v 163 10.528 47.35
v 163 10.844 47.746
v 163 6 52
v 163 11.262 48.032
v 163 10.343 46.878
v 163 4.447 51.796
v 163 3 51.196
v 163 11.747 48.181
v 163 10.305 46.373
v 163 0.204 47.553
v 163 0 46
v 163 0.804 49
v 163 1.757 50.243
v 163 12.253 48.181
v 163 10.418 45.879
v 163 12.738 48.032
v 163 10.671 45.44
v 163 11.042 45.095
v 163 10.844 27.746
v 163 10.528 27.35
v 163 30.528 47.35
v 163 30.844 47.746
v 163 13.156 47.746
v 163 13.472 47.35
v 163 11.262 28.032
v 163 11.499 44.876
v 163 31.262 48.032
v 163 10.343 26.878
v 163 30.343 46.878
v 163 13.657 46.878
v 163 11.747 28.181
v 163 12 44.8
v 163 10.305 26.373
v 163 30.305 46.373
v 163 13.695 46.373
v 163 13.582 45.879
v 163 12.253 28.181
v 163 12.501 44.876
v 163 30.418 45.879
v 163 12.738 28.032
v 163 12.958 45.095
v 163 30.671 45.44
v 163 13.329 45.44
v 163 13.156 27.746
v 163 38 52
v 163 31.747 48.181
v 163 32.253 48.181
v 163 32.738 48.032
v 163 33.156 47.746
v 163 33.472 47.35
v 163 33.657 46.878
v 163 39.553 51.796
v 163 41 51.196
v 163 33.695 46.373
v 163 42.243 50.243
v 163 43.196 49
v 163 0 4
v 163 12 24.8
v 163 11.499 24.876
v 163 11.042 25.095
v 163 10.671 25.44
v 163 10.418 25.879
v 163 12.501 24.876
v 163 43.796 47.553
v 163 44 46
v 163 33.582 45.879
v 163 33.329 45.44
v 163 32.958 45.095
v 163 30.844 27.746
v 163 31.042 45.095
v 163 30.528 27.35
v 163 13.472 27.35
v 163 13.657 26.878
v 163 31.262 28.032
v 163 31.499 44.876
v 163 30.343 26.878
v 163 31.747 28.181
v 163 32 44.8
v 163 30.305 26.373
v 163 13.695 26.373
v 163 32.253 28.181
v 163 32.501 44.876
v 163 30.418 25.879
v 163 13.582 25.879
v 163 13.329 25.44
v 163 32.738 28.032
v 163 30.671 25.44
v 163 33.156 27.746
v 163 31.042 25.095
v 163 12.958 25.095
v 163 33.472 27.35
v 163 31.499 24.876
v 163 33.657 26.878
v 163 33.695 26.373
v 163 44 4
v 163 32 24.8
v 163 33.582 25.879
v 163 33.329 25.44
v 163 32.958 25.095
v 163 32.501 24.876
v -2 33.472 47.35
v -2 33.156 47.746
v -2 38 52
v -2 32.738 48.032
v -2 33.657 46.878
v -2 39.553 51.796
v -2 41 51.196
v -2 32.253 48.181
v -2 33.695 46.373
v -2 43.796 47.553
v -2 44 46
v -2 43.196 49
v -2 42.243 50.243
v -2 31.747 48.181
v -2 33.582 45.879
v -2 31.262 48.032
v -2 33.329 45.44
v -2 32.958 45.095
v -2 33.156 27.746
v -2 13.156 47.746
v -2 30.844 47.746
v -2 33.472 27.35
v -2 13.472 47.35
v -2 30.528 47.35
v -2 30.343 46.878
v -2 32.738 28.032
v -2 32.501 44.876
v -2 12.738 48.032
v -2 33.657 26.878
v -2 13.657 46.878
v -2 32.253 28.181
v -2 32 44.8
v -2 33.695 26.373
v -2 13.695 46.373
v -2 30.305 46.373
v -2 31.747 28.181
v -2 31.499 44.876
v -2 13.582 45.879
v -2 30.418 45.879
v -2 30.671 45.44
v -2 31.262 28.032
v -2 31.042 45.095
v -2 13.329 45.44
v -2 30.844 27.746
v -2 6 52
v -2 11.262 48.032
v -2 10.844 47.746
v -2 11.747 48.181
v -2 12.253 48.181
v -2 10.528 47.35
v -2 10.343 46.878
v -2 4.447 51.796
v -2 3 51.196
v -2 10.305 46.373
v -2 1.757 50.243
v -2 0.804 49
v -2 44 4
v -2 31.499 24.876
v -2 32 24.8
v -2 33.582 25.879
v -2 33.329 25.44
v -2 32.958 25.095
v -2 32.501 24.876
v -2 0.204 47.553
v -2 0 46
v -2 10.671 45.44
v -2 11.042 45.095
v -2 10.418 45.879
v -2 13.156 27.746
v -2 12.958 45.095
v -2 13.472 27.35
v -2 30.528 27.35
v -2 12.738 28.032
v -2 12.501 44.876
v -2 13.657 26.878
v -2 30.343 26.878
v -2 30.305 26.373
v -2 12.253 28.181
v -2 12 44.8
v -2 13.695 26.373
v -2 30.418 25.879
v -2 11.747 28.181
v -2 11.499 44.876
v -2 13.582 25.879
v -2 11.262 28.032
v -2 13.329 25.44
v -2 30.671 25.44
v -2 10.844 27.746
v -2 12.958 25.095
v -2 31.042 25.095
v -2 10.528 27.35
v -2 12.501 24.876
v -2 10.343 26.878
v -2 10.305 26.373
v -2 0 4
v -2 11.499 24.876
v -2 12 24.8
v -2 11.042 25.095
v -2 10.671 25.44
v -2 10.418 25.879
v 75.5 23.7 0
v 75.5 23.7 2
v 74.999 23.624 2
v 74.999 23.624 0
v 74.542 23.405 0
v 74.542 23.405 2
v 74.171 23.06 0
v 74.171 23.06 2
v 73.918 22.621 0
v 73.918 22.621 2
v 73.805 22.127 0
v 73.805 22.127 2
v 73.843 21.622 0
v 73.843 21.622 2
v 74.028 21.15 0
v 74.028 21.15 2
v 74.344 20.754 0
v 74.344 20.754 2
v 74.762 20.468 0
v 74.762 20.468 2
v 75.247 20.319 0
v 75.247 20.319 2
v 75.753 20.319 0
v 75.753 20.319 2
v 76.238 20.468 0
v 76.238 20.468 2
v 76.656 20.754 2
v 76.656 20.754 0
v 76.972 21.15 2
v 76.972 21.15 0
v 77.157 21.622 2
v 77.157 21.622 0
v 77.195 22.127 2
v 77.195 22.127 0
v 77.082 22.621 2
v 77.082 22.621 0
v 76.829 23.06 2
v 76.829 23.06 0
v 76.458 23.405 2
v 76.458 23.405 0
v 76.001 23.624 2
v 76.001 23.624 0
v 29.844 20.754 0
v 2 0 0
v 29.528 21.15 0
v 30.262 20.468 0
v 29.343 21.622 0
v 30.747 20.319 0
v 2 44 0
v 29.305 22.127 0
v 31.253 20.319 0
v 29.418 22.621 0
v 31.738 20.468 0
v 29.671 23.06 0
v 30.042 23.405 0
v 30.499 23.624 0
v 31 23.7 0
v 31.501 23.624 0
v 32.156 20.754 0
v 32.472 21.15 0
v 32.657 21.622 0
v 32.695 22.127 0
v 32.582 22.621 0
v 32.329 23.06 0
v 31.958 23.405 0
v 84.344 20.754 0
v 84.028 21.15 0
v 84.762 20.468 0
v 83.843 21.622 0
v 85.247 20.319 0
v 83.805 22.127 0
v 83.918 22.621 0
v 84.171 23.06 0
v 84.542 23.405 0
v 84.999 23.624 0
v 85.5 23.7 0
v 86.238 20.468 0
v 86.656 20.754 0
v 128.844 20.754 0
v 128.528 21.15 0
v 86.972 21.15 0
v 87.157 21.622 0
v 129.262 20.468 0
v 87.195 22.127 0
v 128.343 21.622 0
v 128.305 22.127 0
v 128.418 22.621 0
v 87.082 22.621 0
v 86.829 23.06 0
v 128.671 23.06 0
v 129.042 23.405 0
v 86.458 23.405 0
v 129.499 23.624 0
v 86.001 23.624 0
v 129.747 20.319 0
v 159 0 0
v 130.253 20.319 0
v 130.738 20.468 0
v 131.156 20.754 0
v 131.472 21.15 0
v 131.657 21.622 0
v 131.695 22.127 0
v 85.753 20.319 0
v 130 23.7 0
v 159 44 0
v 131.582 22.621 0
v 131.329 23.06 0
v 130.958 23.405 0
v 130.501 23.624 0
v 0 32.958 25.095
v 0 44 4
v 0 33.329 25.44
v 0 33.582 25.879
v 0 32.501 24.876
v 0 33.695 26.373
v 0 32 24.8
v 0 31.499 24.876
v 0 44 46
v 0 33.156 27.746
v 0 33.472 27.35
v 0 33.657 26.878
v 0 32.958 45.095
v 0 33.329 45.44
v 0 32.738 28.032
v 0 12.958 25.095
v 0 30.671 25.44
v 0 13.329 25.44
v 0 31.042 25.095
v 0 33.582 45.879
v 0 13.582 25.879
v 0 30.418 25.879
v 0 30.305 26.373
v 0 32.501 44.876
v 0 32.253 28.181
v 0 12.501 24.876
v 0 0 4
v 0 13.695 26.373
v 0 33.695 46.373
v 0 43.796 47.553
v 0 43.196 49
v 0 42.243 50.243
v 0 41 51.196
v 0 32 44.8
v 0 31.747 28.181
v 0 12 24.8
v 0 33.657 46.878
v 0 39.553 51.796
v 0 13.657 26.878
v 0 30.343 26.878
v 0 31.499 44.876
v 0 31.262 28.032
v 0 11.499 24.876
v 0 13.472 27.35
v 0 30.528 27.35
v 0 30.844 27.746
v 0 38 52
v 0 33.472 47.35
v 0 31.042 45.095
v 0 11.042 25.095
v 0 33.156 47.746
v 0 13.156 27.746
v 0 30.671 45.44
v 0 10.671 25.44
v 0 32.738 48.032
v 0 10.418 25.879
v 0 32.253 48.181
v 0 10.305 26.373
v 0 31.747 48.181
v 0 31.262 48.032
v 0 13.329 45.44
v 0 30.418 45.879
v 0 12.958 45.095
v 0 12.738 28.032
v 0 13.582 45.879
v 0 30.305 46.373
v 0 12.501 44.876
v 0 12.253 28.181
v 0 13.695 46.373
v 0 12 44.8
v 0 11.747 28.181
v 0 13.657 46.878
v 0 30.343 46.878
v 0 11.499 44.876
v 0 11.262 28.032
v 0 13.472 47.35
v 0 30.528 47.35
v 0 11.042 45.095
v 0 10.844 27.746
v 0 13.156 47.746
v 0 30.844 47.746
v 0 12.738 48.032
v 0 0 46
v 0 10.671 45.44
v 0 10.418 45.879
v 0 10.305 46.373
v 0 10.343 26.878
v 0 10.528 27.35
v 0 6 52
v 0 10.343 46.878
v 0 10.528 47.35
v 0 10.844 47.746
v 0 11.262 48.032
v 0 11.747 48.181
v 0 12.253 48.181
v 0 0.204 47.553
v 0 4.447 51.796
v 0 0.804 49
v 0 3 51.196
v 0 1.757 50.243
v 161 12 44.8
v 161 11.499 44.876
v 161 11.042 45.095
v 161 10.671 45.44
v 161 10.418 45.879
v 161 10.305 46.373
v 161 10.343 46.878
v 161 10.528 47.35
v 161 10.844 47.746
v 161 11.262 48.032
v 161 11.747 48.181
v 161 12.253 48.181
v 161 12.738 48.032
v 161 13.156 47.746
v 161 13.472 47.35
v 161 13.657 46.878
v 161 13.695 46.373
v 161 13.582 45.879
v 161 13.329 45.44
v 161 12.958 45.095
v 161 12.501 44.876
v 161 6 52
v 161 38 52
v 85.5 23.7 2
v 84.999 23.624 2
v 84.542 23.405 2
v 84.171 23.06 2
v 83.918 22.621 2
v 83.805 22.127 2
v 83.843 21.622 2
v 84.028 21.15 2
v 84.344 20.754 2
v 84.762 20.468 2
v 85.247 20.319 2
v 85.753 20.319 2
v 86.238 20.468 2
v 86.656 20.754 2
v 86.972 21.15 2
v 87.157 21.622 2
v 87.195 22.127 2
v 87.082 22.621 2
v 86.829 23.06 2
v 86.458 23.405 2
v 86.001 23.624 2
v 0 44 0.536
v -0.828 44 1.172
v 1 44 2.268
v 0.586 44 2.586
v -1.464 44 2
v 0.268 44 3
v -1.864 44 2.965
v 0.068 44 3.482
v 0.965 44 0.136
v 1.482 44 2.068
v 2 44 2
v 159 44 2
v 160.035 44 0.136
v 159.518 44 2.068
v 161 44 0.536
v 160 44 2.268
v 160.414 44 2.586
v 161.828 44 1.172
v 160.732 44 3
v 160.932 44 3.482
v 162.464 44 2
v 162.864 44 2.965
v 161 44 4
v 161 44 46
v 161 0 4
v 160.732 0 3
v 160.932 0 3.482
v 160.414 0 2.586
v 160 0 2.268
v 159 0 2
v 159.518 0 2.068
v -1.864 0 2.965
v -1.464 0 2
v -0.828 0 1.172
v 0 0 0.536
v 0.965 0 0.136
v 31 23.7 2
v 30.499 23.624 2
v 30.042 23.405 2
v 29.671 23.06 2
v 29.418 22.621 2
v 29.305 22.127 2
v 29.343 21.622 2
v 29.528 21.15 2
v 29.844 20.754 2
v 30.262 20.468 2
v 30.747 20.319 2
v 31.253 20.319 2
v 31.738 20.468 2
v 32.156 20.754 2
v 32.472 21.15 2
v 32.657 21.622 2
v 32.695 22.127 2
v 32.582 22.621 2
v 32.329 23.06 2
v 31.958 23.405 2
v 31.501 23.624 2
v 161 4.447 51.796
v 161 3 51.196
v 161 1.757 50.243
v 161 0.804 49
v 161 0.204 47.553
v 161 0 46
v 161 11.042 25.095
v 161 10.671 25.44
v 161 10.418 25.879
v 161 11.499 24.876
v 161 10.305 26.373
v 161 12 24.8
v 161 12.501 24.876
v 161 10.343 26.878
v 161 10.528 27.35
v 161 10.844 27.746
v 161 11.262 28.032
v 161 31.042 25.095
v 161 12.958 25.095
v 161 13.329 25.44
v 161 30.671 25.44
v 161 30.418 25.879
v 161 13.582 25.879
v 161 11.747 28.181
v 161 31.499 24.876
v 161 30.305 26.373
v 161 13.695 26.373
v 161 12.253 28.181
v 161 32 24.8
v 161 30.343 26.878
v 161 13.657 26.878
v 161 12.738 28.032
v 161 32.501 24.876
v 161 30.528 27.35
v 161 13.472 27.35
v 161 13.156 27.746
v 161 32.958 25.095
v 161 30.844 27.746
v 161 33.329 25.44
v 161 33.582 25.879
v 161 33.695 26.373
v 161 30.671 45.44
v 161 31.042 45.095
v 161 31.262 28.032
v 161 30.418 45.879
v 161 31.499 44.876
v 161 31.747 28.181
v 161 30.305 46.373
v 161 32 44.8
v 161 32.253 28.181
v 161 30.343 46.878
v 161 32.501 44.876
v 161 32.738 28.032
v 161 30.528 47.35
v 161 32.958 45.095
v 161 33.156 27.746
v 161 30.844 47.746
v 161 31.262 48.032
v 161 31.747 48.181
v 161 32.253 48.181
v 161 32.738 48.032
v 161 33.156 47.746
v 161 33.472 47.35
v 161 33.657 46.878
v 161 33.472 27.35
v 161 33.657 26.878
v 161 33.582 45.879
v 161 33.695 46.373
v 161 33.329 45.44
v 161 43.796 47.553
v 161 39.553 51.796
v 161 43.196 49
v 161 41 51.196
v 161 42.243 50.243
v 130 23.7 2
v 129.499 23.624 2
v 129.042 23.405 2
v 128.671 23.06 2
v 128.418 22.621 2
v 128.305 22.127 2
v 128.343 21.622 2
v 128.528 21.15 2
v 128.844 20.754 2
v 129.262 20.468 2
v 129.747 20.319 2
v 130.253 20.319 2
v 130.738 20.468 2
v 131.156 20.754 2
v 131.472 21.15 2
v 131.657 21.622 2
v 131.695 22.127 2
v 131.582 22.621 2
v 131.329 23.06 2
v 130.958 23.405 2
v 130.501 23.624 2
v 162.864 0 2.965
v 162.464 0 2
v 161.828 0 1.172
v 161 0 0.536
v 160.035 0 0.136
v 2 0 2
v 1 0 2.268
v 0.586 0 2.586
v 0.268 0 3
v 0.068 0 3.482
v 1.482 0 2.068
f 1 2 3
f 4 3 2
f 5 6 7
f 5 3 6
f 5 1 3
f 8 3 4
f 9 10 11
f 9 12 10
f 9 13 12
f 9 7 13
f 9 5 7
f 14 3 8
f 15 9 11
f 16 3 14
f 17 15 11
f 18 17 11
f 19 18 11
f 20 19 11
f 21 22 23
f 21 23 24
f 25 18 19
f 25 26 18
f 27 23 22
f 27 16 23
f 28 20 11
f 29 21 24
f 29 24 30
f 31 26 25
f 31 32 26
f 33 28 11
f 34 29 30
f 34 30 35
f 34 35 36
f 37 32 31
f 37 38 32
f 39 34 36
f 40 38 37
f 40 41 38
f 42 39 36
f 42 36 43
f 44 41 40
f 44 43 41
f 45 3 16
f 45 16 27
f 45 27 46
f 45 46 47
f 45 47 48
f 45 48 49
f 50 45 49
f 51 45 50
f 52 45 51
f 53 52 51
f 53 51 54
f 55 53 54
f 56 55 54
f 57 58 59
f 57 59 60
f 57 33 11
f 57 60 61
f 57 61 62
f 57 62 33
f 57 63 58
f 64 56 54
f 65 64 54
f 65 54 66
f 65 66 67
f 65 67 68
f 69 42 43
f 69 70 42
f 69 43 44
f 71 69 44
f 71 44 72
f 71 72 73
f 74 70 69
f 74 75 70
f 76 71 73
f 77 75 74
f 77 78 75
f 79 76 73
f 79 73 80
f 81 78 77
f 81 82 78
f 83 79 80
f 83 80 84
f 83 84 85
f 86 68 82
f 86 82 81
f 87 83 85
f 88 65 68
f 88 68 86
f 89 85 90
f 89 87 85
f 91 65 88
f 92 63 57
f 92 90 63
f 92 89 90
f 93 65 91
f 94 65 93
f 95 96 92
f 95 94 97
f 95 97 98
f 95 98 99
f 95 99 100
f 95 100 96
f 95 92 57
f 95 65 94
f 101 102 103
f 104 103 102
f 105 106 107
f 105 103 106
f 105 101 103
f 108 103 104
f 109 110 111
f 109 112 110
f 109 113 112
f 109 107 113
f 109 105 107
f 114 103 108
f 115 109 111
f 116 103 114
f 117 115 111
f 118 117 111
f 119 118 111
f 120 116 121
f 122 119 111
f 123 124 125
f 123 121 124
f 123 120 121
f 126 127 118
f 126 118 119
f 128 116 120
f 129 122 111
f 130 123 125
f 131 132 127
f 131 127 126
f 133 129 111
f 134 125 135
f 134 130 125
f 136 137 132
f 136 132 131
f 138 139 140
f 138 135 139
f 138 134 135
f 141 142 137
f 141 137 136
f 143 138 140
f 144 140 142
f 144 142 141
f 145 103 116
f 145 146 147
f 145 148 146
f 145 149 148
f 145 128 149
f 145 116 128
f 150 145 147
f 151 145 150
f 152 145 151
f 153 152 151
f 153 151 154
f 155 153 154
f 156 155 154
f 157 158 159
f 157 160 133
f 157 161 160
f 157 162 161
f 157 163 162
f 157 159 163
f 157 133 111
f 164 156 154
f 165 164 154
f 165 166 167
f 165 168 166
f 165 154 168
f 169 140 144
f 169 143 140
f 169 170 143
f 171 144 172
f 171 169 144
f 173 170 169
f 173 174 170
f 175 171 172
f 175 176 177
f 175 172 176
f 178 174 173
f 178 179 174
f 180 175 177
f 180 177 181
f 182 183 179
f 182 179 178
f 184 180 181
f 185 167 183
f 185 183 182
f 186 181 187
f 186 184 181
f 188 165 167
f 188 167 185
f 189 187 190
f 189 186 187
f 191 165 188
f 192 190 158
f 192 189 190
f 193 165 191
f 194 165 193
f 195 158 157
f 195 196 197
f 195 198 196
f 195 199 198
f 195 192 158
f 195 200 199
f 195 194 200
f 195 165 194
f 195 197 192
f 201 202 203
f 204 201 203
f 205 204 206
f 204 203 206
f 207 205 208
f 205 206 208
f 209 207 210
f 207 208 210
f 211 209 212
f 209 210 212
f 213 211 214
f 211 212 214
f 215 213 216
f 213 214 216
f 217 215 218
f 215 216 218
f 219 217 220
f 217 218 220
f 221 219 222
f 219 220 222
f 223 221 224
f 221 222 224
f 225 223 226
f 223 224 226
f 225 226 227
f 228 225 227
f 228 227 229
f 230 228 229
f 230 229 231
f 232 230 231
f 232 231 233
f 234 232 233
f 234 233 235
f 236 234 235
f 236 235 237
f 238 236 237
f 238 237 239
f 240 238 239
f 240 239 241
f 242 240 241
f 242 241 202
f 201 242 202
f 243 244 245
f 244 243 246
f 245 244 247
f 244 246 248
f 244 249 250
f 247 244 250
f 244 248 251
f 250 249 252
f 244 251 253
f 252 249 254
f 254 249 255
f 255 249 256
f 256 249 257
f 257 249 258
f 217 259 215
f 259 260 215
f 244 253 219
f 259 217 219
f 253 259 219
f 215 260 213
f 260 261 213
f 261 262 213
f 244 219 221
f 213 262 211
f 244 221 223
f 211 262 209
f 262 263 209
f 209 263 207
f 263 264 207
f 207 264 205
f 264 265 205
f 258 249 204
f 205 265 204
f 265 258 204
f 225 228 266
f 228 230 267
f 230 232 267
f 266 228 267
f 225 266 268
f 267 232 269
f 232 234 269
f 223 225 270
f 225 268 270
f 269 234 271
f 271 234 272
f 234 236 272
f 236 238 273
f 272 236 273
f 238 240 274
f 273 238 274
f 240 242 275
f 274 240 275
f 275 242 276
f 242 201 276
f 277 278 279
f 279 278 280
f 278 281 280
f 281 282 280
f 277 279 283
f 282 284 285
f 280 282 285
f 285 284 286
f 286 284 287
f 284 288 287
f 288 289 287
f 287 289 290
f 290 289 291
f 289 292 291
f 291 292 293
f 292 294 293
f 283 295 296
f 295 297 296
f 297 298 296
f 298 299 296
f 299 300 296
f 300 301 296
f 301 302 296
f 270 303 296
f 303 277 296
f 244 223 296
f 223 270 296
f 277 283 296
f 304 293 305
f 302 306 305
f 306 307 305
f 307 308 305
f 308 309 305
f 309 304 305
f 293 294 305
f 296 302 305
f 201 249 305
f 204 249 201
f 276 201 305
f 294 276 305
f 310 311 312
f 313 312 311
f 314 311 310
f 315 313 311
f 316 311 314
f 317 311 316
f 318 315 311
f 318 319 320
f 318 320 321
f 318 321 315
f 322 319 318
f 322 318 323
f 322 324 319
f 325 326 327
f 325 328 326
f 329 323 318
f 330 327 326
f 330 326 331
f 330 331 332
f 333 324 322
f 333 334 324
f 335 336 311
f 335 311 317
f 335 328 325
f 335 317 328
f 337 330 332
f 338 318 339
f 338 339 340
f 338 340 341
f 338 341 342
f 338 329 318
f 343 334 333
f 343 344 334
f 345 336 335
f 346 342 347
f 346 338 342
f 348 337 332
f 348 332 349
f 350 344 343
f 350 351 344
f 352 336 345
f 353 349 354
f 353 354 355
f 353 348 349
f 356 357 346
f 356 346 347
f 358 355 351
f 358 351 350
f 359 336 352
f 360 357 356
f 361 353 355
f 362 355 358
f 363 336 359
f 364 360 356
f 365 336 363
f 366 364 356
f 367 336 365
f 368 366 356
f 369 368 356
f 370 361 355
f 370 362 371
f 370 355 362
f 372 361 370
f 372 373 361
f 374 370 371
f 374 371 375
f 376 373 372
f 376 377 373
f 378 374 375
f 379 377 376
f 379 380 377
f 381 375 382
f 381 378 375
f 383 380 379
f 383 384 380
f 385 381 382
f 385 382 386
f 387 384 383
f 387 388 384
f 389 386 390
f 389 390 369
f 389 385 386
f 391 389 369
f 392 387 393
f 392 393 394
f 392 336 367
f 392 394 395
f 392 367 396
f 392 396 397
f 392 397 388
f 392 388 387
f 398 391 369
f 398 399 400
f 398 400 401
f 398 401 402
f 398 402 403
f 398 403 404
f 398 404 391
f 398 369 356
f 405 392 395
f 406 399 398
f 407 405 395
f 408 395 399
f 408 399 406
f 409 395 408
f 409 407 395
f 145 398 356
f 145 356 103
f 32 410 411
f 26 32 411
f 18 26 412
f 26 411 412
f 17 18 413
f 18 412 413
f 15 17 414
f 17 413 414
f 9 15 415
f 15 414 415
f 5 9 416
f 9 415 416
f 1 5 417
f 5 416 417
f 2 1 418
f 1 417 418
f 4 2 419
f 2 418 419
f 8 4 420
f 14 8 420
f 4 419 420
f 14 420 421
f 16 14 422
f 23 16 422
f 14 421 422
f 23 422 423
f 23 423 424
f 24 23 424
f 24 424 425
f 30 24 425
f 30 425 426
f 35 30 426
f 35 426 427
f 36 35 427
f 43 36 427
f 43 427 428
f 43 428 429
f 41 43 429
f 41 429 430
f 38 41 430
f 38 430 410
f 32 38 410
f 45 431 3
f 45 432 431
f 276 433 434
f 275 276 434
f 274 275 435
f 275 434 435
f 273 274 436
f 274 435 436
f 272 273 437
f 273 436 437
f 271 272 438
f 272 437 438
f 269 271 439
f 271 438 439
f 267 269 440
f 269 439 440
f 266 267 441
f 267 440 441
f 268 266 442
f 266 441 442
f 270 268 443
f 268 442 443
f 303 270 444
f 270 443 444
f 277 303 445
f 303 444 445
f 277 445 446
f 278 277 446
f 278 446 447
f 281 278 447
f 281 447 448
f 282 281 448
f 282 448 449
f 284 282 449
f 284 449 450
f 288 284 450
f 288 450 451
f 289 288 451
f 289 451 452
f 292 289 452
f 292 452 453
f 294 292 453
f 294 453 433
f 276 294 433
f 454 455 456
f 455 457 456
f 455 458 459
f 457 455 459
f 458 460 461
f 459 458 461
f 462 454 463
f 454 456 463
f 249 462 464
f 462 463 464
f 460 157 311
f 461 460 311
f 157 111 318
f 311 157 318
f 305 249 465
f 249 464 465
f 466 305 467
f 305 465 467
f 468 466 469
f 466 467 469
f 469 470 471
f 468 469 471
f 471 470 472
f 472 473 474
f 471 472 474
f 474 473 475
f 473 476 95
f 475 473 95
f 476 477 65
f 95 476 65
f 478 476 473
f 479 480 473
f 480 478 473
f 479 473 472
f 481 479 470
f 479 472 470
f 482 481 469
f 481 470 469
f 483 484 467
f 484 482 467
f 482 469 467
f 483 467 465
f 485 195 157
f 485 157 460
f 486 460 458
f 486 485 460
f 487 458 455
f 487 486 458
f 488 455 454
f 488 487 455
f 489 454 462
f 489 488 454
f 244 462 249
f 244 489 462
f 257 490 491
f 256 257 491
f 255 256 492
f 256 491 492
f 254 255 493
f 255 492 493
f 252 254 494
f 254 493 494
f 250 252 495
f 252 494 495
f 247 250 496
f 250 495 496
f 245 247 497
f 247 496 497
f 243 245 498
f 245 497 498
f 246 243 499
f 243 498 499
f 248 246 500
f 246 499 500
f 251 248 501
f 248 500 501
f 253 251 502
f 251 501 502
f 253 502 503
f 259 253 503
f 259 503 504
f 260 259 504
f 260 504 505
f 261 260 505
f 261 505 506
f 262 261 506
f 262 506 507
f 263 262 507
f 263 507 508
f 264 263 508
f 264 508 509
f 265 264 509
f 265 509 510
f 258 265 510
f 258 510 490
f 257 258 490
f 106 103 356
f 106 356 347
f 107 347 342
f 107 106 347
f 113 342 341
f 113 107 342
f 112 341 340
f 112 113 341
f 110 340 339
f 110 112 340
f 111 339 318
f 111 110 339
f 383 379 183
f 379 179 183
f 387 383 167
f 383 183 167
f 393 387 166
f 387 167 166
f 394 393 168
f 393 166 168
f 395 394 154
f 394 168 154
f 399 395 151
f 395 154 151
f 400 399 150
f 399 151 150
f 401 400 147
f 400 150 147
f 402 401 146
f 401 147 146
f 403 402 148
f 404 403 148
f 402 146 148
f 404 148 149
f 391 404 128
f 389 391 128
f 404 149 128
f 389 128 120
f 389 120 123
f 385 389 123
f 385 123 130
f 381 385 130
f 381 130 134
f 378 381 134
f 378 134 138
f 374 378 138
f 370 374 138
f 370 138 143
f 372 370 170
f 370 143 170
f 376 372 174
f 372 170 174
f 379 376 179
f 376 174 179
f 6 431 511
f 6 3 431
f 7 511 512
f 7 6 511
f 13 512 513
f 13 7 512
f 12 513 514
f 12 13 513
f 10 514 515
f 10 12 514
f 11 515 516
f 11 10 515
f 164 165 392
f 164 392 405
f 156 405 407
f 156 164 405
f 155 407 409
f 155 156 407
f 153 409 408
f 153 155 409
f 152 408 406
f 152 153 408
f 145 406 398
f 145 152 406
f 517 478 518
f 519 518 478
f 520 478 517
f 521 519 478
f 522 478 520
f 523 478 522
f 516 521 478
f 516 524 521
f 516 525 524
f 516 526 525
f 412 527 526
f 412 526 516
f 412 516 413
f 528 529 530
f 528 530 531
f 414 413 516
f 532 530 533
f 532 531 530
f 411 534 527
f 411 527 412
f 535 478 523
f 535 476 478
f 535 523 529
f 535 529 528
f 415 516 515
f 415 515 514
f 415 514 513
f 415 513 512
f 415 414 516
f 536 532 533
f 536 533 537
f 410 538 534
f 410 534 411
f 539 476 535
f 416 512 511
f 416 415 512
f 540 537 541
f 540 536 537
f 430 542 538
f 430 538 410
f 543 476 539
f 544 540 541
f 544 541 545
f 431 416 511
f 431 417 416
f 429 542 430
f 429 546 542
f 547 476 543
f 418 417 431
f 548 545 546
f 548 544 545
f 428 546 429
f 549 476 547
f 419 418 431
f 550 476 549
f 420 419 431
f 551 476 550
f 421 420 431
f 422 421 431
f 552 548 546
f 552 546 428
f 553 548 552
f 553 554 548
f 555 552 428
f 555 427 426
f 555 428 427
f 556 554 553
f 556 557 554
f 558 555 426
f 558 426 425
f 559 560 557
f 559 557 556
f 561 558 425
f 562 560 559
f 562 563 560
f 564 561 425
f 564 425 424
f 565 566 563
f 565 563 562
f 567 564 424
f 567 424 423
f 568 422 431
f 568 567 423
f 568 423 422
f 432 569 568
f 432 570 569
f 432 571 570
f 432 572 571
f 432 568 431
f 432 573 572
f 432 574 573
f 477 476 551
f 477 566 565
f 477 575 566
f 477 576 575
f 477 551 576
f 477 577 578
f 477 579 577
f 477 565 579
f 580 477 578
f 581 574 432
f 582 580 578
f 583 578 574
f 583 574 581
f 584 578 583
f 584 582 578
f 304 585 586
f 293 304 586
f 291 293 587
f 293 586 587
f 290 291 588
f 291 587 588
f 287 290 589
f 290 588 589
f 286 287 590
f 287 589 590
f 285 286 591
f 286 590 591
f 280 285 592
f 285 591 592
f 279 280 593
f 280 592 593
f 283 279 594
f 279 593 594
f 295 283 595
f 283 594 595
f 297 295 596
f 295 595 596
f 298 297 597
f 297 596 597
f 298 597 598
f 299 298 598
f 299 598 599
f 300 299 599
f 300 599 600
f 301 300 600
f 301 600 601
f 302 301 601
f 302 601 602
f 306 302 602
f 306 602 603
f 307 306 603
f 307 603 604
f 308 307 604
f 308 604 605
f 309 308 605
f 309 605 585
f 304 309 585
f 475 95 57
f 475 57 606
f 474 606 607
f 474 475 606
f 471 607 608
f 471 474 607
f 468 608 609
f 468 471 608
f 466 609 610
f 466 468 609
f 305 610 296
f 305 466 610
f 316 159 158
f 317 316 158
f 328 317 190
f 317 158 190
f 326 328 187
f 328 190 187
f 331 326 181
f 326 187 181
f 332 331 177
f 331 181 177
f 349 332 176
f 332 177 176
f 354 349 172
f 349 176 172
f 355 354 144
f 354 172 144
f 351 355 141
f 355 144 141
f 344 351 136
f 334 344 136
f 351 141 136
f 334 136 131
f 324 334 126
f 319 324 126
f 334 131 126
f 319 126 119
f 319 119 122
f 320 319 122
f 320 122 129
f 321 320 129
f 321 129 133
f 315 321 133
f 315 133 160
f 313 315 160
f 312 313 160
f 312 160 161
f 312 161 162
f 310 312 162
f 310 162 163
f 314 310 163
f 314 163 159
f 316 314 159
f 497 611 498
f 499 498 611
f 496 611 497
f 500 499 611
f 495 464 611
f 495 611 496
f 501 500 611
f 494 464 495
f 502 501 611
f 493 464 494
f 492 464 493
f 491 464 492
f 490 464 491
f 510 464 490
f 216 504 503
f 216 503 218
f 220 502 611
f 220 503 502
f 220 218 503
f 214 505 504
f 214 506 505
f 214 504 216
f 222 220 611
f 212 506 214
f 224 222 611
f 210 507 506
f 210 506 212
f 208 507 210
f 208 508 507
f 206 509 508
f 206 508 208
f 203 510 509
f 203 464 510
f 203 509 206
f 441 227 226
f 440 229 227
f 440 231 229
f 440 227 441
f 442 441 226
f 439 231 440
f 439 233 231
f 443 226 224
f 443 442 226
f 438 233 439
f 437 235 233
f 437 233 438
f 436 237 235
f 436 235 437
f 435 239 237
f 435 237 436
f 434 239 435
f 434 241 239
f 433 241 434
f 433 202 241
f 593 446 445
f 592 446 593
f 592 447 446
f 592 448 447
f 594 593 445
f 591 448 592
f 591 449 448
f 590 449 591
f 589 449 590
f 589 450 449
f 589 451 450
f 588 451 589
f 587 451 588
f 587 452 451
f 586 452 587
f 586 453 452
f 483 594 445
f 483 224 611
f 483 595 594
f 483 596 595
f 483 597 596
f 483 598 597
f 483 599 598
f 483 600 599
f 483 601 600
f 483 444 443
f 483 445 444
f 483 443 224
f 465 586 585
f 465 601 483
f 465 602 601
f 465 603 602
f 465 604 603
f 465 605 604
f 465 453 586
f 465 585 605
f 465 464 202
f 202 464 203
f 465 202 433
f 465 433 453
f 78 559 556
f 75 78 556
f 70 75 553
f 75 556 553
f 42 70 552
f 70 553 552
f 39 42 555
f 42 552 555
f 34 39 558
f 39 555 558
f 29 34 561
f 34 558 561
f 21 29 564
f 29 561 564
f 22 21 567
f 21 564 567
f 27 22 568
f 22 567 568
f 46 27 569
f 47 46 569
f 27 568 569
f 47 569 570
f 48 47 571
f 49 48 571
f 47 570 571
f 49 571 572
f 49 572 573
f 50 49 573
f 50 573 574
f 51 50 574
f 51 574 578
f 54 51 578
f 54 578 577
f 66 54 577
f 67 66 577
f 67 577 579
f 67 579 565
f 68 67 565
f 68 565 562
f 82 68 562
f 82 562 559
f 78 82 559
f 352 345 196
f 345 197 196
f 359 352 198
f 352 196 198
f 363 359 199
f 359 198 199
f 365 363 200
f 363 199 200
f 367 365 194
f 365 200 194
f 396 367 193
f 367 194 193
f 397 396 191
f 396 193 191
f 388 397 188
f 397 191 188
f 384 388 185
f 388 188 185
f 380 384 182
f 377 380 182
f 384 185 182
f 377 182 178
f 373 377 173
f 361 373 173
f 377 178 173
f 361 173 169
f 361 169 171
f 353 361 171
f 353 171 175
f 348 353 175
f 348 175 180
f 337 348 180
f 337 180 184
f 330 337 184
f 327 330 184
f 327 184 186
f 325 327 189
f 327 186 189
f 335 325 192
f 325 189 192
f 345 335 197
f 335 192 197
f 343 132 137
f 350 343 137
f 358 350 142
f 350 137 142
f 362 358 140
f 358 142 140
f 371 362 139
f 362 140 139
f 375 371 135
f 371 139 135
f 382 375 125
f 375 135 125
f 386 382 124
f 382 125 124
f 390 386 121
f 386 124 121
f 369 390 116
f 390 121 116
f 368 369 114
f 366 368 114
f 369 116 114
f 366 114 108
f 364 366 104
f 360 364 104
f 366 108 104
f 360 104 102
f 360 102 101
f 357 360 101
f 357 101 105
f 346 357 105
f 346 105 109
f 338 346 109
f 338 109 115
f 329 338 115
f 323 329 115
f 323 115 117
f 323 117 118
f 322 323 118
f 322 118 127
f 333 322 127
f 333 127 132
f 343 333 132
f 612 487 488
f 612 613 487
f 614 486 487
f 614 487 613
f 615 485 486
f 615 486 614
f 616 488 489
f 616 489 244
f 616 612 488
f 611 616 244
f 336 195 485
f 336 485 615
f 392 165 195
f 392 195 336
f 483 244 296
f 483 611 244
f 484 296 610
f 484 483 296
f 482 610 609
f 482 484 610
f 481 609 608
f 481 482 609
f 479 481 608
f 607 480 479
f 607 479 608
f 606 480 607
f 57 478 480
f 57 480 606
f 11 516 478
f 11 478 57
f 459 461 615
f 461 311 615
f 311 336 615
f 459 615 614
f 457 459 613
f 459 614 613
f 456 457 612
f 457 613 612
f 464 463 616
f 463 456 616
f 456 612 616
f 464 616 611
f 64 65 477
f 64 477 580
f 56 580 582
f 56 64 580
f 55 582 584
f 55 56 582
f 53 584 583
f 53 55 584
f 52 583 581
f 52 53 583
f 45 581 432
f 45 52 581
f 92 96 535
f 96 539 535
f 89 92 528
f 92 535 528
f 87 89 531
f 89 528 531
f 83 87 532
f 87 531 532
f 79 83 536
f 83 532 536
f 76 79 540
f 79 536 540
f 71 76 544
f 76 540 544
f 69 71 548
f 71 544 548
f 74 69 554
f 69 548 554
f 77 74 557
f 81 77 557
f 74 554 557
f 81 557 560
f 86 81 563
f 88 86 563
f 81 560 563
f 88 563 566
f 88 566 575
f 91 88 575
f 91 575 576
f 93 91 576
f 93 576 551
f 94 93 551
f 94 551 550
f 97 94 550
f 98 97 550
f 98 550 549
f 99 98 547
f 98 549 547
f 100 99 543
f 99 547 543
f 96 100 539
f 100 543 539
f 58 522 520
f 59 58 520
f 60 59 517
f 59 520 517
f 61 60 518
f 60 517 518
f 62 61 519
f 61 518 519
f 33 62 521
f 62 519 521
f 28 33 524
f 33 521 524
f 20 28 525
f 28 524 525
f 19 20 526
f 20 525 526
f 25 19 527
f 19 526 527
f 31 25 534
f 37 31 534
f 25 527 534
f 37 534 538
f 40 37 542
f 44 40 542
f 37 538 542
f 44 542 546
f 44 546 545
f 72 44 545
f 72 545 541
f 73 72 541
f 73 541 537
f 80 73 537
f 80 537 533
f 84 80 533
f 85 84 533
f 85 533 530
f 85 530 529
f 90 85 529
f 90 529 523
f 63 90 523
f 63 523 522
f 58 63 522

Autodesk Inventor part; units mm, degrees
ref_plane "YZ Plane" through (0, 0, 0) normal (1, 0, 0) x (0, 1, 0)
ref_plane "XZ Plane" through (0, 0, 0) normal (0, 1, 0) x (-1, 0, 0)
ref_plane "XY Plane" through (0, 0, 0) normal (0, 0, 1) x (1, 0, 0)
sketch "Sketch1" plane through (0, 0, 0) normal (0, 0, 1) x (1, 0, 0)
  line L0 (0, 44) -> (161, 44)
  line L1 (161, 44) -> (161, 0)
  line L2 (161, 0) -> (0, 0)
  line L3 (0, 0) -> (0, 44)
  dimension "d0" = 161
  dimension "d1" = 44
extrude "Plate1" add sketch "Sketch1" along normal blind 2
sketch "Sketch2" plane through (0, 0, 2) normal (-1, 0, 0) x (0, -1, 0)
  line L0 (-44, 0) -> (0, 0)
  line L1 (0, 0) -> (0, 50)
  line L2 (0, 50) -> (-44, 50)
  line L3 (-44, 50) -> (-44, 0)
edge flange "Flange1" height 52 angle 90 thickness 2 bend radius 2 thickness toward (-1, 0, 0) relief tear relief width 2 relief depth 1 corner gap 2 corner form 0 edges at (0, 22, 2) (161, 22, 2) wall of the first edge with corners at (0, 44, 2) (0, 0, 2) (0, 0, 52) (0, 44, 52)
bend "Bend1"
corner "Corner1"
sketch "Sketch3" plane through (163, 0, 52) normal (1, 0, 0) x (0, 0, -1)
  line L0 (0, 0) -> (0, 44) construction
  line L1 (5.5, 32) -> (5.5, 12) construction
  point P0 (52, 0)
  point P1 (25.5, 32)
  point P2 (25.5, 12)
  point P3 (0, 22)
  point P4 (5.5, 22)
  dimension "d13" = 20
  dimension "d14" = 20
  dimension "d15" = 5.5
hole "Hole1" at (163, 32, 46.5) at (163, 32, 26.5) at (163, 12, 46.5) at (163, 12, 26.5) direction (-1, 0, 0) diameter 3.4 end through all clearance for "Flat Head Machine Screw" size "M3" standard "Ansi Metric M Profile"
fillet "Corner Round1" radius 6 4 edges at (-1, 0, 52) (-1, 44, 52) (162, 0, 52) (162, 44, 52)
sketch "Sketch4" plane through (0, 0, 0) normal (0, 0, -1) x (-1, 0, 0)
  line L0 (-163, 0) -> (-163, 44) projected
  line L1 (2, 44) -> (2, 0) projected
  point P0 (0, 0)
  point P1 (-130, 22)
  point P2 (-85.5, 22)
  point P3 (-75.5, 22)
  point P4 (-31, 22)
  point P5 (-163, 22)
  dimension "d24" = 10
  dimension "d25" = 33
  dimension "d26" = 33
  dimension "d27" = 44.5
  dimension "d28" = 44.5
hole "Hole2" at (130, 22, 0) at (85.5, 22, 0) at (75.5, 22, 0) at (31, 22, 0) direction (0, 0, 1) diameter 3.4 end through all clearance for "Flat Head Machine Screw" size "M3" standard "Ansi Metric M Profile"
equation "\"d21\" = Thickness"
equation "\"d2\" = Thickness"
equation "\"d3\" = BendReliefWidth"
equation "\"d4\" = BendReliefDepth"
equation "\"d5\" = MinimumRemnant"
equation "\"d6\" = TransitionRadius"
equation "\"d9\" = BendRadius"
equation "\"d10\" = CornerReliefSize"
equation "\"d11\" = GapSize"
equation "\"d12\" = JacobiRadiusSize"
equation "\"d26\" = d25"
equation "\"d28\" = d27"
equation "\"BendRadius\" = Thickness"
equation "\"BendReliefWidth\" = Thickness"
equation "\"BendReliefDepth\" = 0.5 * Thickness"
equation "\"CornerReliefSize\" = 4 * Thickness"
equation "\"MinimumRemnant\" = 2 * Thickness"
equation "\"TransitionRadius\" = BendRadius"
equation "\"JacobiRadiusSize\" = BendRadius"
equation "\"GapSize\" = Thickness"
equation "\"Thickness\" = 2"
properties part number "NEW Z Bracket"
